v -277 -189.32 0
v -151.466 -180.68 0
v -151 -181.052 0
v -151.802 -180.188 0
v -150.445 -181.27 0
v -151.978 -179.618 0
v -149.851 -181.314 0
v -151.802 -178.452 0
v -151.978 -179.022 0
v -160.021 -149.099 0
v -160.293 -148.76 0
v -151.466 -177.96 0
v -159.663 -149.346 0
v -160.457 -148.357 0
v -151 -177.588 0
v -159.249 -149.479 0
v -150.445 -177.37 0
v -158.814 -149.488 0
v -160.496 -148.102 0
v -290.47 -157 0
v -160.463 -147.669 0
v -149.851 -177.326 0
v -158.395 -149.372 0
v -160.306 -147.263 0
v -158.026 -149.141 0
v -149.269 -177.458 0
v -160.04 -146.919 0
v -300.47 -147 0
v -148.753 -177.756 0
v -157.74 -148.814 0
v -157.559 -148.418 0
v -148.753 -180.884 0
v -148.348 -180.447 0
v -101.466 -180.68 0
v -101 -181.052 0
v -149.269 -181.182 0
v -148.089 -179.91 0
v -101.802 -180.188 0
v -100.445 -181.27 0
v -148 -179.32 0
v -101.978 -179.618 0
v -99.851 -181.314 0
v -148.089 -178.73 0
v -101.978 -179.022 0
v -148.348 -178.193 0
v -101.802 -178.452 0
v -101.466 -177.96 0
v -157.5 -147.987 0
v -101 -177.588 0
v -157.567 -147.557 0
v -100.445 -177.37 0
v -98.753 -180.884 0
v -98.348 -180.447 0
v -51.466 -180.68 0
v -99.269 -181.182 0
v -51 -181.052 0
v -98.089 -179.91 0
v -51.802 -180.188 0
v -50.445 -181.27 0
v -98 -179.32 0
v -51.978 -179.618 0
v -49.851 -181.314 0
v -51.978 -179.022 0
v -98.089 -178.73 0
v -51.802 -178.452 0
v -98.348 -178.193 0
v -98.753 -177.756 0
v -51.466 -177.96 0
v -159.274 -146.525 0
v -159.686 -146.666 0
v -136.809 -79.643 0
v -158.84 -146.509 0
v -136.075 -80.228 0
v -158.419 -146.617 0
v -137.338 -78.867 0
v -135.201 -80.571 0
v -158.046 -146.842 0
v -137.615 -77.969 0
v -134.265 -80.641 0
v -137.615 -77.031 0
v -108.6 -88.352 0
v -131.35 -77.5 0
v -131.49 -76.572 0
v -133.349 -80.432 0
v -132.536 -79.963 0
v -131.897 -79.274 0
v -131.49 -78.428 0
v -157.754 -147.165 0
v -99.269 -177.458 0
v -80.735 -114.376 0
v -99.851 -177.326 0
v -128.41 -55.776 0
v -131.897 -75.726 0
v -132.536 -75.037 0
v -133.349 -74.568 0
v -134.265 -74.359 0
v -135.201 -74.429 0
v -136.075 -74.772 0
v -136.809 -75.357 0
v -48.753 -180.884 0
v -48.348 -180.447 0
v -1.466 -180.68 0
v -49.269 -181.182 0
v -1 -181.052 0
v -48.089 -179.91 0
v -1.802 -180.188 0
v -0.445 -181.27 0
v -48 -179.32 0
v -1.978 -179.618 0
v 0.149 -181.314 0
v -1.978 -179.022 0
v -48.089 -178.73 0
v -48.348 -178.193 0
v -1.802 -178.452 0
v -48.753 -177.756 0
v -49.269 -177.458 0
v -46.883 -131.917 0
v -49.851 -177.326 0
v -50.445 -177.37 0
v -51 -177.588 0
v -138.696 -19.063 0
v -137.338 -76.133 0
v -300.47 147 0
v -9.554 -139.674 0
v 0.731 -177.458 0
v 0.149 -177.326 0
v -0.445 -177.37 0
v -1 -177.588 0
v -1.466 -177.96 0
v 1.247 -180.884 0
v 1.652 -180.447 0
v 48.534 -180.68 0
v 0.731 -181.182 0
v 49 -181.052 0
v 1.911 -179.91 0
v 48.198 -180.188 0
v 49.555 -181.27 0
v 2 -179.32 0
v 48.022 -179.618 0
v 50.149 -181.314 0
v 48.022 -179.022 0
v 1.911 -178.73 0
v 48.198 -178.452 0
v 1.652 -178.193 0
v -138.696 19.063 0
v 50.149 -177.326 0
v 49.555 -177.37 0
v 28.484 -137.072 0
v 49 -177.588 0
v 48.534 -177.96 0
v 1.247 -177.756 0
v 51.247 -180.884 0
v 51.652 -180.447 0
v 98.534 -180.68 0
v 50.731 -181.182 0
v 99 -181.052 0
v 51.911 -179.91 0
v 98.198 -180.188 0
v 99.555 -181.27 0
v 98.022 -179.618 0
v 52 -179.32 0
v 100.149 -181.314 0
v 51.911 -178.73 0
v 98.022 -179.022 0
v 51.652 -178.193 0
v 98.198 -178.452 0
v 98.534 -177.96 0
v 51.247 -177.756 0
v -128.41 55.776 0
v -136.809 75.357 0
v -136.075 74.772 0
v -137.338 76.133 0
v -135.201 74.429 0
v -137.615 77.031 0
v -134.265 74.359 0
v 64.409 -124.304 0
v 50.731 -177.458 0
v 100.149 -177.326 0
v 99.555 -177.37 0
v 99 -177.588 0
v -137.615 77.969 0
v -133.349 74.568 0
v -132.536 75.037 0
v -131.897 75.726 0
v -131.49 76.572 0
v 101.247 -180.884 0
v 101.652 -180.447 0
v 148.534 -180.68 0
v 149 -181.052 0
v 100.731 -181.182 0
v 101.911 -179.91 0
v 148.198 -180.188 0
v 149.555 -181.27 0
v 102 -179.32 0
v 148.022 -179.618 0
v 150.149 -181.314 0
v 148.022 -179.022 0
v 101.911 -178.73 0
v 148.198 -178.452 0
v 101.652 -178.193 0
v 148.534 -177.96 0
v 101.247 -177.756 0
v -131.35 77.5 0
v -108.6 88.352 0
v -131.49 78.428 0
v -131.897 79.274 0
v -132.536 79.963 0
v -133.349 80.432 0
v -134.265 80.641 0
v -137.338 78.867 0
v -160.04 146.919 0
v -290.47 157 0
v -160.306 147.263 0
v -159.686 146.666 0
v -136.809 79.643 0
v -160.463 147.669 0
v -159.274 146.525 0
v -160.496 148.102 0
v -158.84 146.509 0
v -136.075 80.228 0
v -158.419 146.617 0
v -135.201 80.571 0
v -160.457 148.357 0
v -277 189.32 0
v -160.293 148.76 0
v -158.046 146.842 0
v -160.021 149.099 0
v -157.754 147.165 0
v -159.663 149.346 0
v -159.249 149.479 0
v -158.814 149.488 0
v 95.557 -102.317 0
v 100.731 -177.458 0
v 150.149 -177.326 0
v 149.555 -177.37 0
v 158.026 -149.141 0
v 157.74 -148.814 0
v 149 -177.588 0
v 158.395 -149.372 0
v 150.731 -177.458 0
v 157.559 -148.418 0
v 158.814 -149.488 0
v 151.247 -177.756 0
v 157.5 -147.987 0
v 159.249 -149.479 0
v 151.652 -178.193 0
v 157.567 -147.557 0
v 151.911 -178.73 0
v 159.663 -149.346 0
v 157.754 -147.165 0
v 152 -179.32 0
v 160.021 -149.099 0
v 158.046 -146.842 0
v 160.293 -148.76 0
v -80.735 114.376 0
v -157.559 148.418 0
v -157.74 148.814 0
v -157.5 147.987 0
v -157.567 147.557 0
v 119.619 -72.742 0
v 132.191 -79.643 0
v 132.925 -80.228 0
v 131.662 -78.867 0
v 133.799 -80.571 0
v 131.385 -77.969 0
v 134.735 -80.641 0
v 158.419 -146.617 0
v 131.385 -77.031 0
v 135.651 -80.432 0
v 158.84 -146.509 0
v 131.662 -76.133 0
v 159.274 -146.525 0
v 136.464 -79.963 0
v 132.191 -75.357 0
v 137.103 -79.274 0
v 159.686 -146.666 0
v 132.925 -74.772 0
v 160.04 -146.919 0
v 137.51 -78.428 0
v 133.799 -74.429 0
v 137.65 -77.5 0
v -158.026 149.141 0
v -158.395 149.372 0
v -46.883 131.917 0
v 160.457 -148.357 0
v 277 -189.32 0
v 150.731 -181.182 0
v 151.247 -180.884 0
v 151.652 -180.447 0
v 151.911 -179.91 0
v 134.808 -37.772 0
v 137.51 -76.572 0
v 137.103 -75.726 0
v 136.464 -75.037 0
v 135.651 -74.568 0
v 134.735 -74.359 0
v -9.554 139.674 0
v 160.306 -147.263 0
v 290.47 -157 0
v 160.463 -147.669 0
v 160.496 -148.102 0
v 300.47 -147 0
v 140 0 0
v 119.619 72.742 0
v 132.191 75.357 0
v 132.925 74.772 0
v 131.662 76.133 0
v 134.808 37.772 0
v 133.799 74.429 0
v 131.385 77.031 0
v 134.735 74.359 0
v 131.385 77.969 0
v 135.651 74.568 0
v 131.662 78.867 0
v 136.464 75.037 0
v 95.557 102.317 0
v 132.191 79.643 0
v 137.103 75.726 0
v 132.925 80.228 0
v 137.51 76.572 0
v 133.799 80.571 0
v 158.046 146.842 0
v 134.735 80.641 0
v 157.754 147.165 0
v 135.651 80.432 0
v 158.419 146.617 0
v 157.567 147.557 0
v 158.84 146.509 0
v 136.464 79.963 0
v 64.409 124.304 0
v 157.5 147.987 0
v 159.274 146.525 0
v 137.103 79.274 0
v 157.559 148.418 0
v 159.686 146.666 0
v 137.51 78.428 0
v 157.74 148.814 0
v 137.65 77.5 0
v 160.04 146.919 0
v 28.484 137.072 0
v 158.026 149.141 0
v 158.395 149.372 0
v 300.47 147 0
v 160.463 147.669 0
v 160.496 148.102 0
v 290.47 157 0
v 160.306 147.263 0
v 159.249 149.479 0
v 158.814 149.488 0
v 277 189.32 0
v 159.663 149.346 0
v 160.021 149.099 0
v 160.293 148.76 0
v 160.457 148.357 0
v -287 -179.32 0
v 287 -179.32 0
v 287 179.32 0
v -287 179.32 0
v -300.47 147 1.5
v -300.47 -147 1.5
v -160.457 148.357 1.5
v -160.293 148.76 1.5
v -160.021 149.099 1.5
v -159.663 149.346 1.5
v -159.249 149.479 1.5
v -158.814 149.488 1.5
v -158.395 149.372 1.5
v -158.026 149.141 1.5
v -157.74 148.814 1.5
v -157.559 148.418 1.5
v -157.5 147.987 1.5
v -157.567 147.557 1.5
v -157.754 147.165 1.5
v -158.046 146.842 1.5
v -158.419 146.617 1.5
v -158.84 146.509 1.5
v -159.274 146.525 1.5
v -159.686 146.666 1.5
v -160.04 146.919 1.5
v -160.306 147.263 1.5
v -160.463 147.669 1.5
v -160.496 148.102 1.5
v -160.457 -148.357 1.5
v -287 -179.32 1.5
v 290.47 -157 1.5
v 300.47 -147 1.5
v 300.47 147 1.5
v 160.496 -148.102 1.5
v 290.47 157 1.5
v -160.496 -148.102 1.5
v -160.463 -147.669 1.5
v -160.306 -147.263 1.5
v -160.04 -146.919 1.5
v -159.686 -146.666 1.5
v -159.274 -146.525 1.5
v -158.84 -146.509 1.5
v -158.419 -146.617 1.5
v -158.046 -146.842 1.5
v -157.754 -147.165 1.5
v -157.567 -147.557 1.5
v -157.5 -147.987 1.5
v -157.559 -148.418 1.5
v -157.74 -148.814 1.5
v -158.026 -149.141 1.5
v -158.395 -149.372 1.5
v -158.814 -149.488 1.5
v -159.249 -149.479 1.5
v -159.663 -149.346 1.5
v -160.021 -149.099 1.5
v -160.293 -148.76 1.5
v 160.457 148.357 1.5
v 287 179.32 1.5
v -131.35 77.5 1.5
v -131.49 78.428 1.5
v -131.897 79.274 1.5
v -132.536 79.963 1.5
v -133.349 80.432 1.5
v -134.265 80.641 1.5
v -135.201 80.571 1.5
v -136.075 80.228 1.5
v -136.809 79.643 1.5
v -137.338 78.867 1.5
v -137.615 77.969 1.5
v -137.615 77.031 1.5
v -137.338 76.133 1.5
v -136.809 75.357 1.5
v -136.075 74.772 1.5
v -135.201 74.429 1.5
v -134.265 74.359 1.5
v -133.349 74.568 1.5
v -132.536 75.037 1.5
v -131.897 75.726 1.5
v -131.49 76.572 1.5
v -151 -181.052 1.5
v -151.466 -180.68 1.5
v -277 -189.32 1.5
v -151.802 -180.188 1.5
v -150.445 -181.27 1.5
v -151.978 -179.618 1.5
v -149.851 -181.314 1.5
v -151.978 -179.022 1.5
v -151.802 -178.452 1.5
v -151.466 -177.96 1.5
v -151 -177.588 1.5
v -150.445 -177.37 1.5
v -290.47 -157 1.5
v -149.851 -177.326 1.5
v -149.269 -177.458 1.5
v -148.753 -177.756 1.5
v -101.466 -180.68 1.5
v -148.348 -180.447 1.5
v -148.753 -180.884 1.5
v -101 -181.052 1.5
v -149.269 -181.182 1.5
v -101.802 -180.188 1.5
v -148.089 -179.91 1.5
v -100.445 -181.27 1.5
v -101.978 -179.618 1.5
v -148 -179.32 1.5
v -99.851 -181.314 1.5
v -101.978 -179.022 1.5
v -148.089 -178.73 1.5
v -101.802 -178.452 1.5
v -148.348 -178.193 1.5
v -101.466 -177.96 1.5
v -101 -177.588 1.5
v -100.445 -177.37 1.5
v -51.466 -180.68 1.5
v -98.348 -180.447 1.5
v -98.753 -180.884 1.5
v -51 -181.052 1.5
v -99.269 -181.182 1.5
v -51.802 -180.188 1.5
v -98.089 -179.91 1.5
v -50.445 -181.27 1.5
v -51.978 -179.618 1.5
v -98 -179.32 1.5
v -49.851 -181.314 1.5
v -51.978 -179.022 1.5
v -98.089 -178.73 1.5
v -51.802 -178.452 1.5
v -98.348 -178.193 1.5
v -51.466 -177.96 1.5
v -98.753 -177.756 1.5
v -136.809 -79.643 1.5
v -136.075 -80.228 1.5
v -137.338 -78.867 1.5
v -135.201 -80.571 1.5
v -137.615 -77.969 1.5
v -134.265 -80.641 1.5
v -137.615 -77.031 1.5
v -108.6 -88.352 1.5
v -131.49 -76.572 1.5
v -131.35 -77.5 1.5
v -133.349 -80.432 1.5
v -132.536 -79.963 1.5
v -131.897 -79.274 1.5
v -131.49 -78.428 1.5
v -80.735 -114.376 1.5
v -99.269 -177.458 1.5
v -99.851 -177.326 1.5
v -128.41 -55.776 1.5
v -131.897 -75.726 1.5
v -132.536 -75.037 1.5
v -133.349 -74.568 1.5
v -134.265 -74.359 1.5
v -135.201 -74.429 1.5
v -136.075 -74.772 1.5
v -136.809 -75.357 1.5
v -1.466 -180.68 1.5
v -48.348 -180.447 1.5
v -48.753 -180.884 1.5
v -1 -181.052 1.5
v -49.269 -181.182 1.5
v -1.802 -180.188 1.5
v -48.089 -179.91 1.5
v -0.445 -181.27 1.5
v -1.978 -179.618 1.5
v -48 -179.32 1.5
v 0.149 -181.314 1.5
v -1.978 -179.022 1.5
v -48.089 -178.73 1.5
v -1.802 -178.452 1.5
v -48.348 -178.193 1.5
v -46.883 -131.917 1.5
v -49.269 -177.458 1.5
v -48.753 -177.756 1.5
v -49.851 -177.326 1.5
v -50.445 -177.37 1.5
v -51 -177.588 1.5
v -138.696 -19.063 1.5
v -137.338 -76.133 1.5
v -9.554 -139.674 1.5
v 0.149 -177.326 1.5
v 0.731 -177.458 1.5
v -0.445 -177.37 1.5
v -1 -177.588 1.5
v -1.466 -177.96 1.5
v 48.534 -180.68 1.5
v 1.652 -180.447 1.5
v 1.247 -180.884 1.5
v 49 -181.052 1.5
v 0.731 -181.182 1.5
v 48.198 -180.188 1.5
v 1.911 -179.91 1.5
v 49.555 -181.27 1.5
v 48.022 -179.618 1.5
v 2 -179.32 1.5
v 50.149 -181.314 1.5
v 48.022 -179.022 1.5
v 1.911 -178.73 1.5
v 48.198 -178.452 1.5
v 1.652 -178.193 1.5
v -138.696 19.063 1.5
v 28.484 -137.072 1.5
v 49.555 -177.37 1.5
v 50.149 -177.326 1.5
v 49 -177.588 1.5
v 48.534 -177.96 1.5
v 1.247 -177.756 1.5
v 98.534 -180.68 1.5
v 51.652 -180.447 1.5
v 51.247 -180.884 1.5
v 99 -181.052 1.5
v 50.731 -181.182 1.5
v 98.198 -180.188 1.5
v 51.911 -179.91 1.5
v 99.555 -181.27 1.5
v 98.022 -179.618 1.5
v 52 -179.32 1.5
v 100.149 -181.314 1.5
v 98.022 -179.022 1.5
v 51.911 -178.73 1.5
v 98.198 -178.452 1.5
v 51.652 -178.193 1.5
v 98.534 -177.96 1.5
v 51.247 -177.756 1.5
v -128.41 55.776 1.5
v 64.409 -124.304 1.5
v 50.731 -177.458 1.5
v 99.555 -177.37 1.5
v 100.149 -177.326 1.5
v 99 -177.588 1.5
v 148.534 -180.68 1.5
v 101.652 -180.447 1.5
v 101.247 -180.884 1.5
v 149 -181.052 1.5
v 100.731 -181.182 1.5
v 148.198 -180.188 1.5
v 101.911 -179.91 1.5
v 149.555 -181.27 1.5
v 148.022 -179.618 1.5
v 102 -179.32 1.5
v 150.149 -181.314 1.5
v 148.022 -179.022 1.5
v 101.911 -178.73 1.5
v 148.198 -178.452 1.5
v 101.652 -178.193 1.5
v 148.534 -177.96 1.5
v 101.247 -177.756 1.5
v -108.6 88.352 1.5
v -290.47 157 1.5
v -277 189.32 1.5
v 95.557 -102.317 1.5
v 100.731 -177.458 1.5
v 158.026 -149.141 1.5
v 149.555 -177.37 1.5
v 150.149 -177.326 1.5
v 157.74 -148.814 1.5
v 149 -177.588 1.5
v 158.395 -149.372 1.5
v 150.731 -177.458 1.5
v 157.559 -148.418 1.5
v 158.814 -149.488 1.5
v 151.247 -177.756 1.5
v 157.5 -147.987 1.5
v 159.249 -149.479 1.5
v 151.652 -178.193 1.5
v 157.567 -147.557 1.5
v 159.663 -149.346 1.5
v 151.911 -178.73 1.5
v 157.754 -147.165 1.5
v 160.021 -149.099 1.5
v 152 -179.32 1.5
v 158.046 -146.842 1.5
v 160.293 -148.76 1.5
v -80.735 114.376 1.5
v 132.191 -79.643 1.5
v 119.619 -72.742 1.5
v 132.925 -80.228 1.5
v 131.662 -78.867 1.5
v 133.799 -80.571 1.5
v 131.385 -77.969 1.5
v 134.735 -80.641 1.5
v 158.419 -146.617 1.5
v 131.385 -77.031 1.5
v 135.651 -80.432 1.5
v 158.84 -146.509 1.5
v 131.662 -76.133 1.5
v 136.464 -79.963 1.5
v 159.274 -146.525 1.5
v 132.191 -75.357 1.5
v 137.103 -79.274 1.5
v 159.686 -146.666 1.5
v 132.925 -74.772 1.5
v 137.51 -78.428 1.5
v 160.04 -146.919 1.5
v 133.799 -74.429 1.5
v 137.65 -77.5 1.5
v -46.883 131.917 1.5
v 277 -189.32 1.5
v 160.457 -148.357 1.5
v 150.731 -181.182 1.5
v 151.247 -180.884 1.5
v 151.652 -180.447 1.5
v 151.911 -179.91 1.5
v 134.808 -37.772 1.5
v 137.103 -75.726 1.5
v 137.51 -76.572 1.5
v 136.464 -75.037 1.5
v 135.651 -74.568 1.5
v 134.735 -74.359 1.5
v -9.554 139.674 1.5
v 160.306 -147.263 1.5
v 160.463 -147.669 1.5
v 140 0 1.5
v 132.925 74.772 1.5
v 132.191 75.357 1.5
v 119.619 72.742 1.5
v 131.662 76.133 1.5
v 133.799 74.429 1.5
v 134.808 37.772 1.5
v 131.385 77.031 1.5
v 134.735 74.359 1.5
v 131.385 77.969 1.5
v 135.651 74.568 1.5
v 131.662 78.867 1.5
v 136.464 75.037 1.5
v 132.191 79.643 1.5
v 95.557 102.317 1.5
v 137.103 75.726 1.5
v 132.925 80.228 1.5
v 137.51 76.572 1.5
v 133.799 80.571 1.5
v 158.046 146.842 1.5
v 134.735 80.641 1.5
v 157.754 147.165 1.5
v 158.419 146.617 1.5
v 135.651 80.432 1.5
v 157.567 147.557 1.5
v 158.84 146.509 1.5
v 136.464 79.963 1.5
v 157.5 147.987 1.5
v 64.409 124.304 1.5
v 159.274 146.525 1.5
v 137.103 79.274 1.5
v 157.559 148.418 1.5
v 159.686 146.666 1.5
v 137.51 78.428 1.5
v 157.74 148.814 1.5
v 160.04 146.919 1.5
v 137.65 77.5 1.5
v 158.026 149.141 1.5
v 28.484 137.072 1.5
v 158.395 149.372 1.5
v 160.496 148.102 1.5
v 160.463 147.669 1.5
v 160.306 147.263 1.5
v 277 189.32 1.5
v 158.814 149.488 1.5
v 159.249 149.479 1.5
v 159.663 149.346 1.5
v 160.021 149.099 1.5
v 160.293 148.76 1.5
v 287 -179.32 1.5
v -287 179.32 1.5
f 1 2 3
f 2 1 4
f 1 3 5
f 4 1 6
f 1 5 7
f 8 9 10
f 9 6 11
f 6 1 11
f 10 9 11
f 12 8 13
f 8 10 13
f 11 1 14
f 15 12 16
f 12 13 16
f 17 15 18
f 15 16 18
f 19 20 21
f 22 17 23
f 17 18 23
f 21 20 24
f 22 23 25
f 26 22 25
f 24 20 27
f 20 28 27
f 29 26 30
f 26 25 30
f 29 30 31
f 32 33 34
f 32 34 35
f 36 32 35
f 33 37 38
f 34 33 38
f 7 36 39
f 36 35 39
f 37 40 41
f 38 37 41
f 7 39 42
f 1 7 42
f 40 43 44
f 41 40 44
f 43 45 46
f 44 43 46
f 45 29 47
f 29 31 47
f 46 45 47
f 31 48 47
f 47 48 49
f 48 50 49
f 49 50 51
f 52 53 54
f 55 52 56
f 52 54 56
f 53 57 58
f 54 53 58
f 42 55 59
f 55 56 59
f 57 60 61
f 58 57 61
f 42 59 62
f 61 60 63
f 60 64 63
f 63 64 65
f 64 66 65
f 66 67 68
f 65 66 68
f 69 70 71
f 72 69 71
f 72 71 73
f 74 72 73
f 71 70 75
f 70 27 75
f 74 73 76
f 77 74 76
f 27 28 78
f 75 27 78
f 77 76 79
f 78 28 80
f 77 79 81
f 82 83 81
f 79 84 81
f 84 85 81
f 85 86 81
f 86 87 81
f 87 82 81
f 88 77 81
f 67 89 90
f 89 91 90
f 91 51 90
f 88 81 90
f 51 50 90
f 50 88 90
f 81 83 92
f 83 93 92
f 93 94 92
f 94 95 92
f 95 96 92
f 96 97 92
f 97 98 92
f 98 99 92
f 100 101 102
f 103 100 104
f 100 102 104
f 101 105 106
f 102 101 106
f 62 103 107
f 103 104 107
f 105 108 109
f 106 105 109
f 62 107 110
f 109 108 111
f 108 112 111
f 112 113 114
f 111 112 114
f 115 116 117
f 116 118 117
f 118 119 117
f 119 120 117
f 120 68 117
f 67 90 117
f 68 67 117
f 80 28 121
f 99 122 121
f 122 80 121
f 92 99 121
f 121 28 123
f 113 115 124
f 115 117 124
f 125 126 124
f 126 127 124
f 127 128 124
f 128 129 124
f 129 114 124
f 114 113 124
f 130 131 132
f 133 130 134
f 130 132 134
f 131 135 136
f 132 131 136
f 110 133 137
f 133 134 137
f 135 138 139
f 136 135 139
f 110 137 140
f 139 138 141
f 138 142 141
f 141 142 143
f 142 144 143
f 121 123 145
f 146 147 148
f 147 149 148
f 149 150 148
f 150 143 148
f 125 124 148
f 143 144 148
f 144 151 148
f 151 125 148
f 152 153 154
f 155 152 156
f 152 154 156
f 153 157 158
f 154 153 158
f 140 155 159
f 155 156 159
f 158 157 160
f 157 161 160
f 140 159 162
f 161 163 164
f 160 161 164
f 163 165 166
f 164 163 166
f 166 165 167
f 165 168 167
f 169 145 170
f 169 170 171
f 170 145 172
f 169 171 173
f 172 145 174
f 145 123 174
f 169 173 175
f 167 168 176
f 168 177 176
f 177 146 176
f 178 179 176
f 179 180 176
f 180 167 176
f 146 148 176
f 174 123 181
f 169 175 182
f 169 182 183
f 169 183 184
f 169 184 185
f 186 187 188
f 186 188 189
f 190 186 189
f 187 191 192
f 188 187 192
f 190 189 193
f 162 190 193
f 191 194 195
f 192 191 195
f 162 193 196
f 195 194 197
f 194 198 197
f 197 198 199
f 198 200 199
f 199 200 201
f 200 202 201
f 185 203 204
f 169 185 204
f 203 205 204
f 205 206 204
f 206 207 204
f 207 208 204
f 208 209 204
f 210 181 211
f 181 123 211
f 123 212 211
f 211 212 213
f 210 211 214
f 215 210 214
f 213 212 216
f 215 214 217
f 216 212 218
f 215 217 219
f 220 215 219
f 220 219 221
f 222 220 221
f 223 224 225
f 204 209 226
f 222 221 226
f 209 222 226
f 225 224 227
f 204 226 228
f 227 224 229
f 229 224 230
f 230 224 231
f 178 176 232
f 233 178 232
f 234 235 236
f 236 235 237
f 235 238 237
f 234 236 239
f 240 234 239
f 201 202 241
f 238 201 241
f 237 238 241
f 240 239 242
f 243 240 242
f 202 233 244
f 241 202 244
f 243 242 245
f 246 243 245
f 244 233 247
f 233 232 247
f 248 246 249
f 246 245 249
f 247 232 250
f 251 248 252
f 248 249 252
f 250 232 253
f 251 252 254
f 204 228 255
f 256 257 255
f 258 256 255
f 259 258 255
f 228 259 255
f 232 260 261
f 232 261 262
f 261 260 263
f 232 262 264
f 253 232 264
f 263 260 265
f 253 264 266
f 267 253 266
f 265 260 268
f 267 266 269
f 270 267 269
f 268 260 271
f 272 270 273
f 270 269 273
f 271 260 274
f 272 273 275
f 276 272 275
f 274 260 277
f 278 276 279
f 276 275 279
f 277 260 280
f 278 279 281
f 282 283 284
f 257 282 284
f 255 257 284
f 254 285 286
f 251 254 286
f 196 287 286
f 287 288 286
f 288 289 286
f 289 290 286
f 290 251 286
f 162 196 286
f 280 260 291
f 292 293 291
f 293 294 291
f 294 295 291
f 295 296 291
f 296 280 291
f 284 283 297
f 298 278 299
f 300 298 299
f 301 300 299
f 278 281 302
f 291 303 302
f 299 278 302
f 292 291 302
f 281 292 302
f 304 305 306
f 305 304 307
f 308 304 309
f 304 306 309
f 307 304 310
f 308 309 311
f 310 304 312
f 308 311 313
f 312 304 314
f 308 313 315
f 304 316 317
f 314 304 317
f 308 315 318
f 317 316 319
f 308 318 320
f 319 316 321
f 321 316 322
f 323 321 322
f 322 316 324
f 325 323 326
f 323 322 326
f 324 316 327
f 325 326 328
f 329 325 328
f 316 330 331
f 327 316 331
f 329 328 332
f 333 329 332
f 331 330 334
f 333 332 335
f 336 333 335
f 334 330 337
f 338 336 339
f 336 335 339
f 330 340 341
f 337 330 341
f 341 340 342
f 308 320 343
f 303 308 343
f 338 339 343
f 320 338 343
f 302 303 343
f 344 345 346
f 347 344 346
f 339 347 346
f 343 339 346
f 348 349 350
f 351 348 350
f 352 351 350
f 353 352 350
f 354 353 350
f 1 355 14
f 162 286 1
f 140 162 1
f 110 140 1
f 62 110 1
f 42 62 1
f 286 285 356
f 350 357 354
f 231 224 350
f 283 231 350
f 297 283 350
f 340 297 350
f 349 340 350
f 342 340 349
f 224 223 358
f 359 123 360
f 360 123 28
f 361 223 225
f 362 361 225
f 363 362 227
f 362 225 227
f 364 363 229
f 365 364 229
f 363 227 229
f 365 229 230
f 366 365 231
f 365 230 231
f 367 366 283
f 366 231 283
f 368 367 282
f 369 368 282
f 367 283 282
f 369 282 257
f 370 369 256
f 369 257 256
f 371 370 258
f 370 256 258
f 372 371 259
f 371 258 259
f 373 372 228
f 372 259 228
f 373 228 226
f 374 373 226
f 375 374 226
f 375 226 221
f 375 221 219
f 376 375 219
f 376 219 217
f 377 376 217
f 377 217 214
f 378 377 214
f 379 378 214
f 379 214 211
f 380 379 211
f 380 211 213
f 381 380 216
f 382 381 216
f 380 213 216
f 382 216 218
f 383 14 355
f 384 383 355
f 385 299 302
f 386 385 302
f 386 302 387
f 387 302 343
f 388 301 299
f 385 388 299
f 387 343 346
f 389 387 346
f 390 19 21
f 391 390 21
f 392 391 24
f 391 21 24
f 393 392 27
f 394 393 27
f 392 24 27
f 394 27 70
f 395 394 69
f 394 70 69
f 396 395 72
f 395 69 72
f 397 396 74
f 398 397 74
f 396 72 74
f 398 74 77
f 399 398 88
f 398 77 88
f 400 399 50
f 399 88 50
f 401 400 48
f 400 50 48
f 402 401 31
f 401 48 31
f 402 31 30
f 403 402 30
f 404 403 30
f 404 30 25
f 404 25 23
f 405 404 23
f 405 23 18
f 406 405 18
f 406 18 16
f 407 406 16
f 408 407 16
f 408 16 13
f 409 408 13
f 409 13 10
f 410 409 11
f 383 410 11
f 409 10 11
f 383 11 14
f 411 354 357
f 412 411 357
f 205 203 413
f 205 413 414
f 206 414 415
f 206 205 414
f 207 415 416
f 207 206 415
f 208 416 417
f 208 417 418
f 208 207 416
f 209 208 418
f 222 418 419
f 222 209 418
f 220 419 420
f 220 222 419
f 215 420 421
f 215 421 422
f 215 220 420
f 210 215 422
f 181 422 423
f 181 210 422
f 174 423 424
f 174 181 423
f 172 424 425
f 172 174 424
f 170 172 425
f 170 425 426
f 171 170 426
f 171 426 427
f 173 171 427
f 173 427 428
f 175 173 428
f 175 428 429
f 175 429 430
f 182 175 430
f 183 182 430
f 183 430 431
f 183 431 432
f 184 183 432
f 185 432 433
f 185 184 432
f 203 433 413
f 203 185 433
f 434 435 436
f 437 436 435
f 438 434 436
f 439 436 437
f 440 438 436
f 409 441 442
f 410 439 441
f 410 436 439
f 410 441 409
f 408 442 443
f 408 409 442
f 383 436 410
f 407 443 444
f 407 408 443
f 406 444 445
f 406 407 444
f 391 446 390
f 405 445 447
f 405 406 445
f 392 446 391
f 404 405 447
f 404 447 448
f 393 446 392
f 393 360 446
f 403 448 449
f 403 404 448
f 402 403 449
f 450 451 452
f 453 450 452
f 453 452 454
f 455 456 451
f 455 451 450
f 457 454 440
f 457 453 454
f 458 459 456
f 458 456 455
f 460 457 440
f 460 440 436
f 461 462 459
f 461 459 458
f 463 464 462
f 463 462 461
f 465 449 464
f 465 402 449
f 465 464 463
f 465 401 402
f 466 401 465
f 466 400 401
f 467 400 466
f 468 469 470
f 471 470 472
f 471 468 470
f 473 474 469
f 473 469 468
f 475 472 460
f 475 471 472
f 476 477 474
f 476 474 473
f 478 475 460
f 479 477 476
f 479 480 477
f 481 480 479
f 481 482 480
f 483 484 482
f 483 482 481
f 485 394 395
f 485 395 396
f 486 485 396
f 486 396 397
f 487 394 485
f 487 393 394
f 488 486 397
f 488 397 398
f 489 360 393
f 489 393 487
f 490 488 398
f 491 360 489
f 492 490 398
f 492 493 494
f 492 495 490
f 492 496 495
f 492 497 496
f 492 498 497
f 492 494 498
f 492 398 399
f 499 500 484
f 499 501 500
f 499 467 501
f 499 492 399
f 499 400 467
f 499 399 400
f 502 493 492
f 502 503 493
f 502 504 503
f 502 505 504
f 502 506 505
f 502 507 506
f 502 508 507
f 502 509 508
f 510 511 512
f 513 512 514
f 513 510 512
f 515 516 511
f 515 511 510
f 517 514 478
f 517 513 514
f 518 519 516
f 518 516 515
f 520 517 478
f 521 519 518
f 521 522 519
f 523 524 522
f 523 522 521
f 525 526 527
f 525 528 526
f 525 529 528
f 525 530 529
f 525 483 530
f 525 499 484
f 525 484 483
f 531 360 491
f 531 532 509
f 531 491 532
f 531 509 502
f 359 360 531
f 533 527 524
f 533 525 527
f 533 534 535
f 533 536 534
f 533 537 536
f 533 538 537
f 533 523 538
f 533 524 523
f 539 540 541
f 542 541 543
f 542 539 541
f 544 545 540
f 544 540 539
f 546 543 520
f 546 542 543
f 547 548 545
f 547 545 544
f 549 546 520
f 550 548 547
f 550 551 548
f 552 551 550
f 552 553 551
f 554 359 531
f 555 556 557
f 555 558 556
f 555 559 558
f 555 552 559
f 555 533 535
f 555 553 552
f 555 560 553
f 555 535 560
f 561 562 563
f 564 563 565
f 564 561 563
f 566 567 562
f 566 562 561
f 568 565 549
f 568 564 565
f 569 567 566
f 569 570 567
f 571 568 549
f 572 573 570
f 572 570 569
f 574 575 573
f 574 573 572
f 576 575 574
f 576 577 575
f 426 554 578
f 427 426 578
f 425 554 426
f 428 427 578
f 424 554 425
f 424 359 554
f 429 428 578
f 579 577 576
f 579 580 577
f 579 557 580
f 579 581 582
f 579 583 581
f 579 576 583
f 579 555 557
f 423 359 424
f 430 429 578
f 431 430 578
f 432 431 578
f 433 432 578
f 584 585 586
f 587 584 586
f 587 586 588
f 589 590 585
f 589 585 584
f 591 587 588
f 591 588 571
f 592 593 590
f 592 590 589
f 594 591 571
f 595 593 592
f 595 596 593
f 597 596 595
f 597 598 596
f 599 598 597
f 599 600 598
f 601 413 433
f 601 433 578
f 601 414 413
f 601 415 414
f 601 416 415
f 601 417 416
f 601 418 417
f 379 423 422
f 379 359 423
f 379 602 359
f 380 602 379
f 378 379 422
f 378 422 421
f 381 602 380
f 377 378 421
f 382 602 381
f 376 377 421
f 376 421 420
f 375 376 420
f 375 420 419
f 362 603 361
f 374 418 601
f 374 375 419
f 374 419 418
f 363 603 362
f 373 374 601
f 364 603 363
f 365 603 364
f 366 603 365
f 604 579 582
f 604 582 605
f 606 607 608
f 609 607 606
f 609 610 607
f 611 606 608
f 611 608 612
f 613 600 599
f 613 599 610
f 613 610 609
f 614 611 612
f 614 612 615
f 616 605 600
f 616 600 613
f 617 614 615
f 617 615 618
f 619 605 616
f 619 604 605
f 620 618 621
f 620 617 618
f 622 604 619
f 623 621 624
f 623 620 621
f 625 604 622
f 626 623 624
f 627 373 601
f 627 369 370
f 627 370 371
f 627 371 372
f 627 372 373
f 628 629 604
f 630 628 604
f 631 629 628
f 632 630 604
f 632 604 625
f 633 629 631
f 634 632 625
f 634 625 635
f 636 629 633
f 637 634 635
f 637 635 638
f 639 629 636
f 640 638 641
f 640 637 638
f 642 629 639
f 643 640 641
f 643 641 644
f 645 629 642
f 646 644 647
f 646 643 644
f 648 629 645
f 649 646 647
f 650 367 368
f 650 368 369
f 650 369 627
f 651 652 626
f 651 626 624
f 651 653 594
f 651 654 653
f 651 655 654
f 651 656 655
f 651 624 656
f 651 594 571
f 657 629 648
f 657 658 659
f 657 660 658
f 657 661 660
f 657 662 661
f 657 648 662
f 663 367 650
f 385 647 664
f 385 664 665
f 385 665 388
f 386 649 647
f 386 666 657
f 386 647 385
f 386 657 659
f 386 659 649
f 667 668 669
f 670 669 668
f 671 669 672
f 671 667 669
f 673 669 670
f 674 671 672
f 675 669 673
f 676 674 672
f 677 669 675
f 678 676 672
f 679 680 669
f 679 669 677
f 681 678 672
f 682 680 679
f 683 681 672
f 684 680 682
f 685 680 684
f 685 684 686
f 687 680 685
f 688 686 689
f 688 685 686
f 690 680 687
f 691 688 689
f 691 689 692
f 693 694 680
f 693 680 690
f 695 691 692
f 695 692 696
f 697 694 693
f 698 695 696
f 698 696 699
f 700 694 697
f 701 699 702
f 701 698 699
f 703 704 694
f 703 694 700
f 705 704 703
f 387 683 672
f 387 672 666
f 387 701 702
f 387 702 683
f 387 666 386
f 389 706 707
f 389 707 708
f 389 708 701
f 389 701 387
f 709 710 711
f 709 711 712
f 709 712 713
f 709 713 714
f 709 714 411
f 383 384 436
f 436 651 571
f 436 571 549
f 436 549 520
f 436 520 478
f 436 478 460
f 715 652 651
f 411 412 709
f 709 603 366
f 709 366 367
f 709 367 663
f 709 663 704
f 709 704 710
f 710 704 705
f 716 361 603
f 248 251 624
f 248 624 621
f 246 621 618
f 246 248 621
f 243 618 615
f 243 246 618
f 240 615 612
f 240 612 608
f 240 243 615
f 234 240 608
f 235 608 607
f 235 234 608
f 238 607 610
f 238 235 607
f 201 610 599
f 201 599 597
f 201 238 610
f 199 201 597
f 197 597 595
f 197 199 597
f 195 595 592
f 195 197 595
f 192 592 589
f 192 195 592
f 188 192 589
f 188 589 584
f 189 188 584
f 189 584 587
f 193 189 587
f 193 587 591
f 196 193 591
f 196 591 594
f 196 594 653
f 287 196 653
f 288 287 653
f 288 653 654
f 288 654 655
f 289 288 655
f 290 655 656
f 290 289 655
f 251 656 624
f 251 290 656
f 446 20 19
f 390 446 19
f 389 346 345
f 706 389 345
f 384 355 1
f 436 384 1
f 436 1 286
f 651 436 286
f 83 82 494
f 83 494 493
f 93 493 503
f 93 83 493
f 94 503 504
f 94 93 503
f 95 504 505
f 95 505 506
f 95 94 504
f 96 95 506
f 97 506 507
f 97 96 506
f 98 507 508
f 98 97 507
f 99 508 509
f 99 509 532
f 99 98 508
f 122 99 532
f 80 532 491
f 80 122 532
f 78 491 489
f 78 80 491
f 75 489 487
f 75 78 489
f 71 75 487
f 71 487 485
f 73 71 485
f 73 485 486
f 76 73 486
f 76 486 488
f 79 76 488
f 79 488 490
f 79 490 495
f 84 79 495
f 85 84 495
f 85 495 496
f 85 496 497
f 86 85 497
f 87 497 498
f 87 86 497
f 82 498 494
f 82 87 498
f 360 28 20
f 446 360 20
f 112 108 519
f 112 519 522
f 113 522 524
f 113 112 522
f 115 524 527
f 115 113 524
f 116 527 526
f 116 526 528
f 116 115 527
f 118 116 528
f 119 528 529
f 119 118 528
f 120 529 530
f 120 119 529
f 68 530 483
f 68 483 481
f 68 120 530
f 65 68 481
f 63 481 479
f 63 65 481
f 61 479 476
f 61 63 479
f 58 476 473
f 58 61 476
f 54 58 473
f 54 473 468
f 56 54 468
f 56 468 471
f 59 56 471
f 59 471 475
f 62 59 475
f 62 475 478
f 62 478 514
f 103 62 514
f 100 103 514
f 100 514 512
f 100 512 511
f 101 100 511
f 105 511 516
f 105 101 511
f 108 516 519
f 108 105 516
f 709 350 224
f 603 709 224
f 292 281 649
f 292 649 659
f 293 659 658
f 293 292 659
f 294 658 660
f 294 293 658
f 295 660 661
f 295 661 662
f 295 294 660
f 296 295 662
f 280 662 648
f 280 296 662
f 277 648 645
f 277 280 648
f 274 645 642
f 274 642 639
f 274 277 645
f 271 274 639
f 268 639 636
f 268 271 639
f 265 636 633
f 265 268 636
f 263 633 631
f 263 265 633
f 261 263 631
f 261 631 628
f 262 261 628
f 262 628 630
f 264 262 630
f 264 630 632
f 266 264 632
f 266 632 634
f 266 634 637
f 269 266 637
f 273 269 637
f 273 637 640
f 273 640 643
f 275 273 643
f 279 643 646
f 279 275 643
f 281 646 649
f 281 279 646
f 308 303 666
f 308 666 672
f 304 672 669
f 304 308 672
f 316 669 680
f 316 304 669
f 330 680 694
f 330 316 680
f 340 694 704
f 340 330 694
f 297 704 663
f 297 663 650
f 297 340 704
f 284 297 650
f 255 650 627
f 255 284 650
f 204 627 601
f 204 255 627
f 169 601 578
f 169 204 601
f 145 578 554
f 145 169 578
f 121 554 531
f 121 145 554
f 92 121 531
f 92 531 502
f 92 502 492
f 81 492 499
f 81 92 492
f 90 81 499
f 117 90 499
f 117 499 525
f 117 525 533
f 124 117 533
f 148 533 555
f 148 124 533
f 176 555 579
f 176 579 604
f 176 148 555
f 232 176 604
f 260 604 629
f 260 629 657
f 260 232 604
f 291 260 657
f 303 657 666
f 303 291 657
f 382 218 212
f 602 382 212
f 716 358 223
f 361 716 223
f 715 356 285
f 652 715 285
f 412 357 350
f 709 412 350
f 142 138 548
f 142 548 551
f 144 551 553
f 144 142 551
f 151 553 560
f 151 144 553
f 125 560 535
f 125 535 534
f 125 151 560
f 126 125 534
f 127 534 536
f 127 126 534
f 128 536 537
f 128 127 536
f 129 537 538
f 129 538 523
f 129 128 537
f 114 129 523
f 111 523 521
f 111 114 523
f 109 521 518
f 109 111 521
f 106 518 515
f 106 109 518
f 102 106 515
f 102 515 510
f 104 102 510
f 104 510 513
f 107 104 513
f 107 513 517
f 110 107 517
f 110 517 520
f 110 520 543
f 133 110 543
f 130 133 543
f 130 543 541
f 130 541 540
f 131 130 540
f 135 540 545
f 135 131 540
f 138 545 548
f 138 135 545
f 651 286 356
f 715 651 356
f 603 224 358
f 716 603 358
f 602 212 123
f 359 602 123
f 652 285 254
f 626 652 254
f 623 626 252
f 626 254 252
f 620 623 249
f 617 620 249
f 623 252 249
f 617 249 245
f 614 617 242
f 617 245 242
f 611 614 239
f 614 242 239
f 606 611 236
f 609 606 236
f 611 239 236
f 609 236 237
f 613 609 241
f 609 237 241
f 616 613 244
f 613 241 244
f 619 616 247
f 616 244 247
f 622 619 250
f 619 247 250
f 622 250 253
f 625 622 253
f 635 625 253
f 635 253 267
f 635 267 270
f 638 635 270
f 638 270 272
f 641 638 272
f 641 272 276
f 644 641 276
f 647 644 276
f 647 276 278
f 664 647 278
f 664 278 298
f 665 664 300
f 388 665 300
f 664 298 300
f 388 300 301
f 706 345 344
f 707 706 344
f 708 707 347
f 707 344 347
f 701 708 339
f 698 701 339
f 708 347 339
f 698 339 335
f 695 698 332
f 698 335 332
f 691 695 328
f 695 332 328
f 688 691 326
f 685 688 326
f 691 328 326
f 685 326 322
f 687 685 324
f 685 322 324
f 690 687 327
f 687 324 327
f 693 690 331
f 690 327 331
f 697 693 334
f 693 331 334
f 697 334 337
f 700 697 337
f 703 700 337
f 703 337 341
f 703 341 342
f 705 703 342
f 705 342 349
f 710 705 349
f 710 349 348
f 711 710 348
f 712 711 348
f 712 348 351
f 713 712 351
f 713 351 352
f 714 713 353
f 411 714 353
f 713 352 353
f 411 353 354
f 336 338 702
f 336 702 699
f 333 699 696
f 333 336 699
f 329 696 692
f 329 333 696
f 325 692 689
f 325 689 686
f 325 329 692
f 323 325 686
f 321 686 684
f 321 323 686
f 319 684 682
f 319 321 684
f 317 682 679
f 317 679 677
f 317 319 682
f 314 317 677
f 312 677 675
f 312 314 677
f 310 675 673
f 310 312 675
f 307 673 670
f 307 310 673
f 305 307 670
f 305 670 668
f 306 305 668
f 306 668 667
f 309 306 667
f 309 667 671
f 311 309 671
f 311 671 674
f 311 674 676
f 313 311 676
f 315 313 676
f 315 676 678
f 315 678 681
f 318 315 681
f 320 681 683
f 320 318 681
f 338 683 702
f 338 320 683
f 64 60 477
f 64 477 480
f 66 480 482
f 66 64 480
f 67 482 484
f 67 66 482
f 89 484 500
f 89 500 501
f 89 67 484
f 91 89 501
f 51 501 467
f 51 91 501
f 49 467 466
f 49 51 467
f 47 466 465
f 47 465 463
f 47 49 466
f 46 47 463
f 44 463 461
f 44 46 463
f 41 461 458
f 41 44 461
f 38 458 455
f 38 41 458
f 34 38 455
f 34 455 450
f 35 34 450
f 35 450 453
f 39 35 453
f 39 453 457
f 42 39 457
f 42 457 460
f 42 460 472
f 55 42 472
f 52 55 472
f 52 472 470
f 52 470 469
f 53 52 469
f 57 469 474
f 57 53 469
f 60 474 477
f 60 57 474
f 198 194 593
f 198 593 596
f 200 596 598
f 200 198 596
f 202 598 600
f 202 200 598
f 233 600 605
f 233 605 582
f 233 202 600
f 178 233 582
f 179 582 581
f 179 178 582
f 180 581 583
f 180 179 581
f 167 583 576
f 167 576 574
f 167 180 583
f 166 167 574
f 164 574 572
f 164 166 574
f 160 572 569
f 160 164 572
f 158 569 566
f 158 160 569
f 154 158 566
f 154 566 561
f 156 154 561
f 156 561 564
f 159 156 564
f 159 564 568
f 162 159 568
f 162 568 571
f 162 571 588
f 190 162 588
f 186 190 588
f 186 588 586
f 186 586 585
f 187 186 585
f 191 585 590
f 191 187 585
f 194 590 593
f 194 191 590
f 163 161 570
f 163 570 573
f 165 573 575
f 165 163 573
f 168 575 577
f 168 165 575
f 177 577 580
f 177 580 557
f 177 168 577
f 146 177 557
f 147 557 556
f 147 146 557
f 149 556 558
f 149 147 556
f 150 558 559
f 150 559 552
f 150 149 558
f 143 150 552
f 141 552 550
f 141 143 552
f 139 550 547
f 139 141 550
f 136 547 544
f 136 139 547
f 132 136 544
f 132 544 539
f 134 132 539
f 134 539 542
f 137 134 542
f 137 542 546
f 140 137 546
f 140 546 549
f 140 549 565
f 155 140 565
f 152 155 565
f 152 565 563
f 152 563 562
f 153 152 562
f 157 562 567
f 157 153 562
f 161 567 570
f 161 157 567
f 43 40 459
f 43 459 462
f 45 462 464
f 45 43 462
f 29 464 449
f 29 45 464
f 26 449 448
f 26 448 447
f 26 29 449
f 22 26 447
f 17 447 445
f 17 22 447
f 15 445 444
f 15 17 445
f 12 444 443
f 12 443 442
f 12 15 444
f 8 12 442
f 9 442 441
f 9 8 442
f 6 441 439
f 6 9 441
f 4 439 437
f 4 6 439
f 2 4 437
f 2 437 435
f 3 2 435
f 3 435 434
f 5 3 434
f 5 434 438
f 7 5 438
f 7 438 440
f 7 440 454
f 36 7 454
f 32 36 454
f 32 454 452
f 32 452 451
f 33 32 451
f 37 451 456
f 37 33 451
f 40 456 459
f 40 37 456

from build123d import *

# Parameters (mm, degrees)
F0_R     = 2
F0_R_2   = 3.15
F0_R_3   = 140
F1_DEPTH = 1.5


with BuildPart() as f1:
    # F0 (on Top) → F1 (new body)
    with BuildSketch(Plane.XY):
        with BuildLine():
            Line((-160.457017, -148.356514), (-287, -179.32))
            Line((-287, -179.32), (-277, -189.32))
            Line((-277, -189.32), (277, -189.32))
            Line((277, -189.32), (287, -179.32))
            Line((287, -179.32), (160.457017, -148.356514))
            ThreePointArc((160.457017, -148.356514), (157.517789, -147.769673), (160.496498, -148.102445))
            Line((160.496498, -148.102445), (290.47, -157))
            Line((290.47, -157), (300.47, -147))
            Line((300.47, -147), (300.47, 147))
            Line((300.47, 147), (290.47, 157))
            Line((290.47, 157), (160.496498, 148.102445))
            ThreePointArc((160.496498, 148.102445), (157.517789, 147.769673), (160.457017, 148.356514))
            Line((160.457017, 148.356514), (287, 179.32))
            Line((287, 179.32), (277, 189.32))
            Line((277, 189.32), (-277, 189.32))
            Line((-277, 189.32), (-287, 179.32))
            Line((-287, 179.32), (-160.457017, 148.356514))
            ThreePointArc((-160.457017, 148.356514), (-157.517789, 147.769673), (-160.496498, 148.102445))
            Line((-160.496498, 148.102445), (-290.47, 157))
            Line((-290.47, 157), (-300.47, 147))
            Line((-300.47, 147), (-300.47, -147))
            Line((-300.47, -147), (-290.47, -157))
            Line((-290.47, -157), (-160.496498, -148.102445))
            ThreePointArc((-160.496498, -148.102445), (-157.517789, -147.769673), (-160.457017, -148.356514))
        make_face()
        with Locations((-150, -179.32)):
            Circle(F0_R, mode=Mode.SUBTRACT)
        with Locations((-100, -179.32)):
            Circle(F0_R, mode=Mode.SUBTRACT)
        with Locations((-50, -179.32)):
            Circle(F0_R, mode=Mode.SUBTRACT)
        with Locations((-134.5, -77.5)):
            Circle(F0_R_2, mode=Mode.SUBTRACT)
        with Locations((0, -179.32)):
            Circle(F0_R, mode=Mode.SUBTRACT)
        with Locations((50, -179.32)):
            Circle(F0_R, mode=Mode.SUBTRACT)
        with Locations((100, -179.32)):
            Circle(F0_R, mode=Mode.SUBTRACT)
        with Locations((150, -179.32)):
            Circle(F0_R, mode=Mode.SUBTRACT)
        with Locations((134.5, -77.5)):
            Circle(F0_R_2, mode=Mode.SUBTRACT)
        with Locations((-134.5, 77.5)):
            Circle(F0_R_2, mode=Mode.SUBTRACT)
        Circle(F0_R_3, mode=Mode.SUBTRACT)
        with Locations((134.5, 77.5)):
            Circle(F0_R_2, mode=Mode.SUBTRACT)
    extrude(amount=F1_DEPTH)


solid = f1.part
